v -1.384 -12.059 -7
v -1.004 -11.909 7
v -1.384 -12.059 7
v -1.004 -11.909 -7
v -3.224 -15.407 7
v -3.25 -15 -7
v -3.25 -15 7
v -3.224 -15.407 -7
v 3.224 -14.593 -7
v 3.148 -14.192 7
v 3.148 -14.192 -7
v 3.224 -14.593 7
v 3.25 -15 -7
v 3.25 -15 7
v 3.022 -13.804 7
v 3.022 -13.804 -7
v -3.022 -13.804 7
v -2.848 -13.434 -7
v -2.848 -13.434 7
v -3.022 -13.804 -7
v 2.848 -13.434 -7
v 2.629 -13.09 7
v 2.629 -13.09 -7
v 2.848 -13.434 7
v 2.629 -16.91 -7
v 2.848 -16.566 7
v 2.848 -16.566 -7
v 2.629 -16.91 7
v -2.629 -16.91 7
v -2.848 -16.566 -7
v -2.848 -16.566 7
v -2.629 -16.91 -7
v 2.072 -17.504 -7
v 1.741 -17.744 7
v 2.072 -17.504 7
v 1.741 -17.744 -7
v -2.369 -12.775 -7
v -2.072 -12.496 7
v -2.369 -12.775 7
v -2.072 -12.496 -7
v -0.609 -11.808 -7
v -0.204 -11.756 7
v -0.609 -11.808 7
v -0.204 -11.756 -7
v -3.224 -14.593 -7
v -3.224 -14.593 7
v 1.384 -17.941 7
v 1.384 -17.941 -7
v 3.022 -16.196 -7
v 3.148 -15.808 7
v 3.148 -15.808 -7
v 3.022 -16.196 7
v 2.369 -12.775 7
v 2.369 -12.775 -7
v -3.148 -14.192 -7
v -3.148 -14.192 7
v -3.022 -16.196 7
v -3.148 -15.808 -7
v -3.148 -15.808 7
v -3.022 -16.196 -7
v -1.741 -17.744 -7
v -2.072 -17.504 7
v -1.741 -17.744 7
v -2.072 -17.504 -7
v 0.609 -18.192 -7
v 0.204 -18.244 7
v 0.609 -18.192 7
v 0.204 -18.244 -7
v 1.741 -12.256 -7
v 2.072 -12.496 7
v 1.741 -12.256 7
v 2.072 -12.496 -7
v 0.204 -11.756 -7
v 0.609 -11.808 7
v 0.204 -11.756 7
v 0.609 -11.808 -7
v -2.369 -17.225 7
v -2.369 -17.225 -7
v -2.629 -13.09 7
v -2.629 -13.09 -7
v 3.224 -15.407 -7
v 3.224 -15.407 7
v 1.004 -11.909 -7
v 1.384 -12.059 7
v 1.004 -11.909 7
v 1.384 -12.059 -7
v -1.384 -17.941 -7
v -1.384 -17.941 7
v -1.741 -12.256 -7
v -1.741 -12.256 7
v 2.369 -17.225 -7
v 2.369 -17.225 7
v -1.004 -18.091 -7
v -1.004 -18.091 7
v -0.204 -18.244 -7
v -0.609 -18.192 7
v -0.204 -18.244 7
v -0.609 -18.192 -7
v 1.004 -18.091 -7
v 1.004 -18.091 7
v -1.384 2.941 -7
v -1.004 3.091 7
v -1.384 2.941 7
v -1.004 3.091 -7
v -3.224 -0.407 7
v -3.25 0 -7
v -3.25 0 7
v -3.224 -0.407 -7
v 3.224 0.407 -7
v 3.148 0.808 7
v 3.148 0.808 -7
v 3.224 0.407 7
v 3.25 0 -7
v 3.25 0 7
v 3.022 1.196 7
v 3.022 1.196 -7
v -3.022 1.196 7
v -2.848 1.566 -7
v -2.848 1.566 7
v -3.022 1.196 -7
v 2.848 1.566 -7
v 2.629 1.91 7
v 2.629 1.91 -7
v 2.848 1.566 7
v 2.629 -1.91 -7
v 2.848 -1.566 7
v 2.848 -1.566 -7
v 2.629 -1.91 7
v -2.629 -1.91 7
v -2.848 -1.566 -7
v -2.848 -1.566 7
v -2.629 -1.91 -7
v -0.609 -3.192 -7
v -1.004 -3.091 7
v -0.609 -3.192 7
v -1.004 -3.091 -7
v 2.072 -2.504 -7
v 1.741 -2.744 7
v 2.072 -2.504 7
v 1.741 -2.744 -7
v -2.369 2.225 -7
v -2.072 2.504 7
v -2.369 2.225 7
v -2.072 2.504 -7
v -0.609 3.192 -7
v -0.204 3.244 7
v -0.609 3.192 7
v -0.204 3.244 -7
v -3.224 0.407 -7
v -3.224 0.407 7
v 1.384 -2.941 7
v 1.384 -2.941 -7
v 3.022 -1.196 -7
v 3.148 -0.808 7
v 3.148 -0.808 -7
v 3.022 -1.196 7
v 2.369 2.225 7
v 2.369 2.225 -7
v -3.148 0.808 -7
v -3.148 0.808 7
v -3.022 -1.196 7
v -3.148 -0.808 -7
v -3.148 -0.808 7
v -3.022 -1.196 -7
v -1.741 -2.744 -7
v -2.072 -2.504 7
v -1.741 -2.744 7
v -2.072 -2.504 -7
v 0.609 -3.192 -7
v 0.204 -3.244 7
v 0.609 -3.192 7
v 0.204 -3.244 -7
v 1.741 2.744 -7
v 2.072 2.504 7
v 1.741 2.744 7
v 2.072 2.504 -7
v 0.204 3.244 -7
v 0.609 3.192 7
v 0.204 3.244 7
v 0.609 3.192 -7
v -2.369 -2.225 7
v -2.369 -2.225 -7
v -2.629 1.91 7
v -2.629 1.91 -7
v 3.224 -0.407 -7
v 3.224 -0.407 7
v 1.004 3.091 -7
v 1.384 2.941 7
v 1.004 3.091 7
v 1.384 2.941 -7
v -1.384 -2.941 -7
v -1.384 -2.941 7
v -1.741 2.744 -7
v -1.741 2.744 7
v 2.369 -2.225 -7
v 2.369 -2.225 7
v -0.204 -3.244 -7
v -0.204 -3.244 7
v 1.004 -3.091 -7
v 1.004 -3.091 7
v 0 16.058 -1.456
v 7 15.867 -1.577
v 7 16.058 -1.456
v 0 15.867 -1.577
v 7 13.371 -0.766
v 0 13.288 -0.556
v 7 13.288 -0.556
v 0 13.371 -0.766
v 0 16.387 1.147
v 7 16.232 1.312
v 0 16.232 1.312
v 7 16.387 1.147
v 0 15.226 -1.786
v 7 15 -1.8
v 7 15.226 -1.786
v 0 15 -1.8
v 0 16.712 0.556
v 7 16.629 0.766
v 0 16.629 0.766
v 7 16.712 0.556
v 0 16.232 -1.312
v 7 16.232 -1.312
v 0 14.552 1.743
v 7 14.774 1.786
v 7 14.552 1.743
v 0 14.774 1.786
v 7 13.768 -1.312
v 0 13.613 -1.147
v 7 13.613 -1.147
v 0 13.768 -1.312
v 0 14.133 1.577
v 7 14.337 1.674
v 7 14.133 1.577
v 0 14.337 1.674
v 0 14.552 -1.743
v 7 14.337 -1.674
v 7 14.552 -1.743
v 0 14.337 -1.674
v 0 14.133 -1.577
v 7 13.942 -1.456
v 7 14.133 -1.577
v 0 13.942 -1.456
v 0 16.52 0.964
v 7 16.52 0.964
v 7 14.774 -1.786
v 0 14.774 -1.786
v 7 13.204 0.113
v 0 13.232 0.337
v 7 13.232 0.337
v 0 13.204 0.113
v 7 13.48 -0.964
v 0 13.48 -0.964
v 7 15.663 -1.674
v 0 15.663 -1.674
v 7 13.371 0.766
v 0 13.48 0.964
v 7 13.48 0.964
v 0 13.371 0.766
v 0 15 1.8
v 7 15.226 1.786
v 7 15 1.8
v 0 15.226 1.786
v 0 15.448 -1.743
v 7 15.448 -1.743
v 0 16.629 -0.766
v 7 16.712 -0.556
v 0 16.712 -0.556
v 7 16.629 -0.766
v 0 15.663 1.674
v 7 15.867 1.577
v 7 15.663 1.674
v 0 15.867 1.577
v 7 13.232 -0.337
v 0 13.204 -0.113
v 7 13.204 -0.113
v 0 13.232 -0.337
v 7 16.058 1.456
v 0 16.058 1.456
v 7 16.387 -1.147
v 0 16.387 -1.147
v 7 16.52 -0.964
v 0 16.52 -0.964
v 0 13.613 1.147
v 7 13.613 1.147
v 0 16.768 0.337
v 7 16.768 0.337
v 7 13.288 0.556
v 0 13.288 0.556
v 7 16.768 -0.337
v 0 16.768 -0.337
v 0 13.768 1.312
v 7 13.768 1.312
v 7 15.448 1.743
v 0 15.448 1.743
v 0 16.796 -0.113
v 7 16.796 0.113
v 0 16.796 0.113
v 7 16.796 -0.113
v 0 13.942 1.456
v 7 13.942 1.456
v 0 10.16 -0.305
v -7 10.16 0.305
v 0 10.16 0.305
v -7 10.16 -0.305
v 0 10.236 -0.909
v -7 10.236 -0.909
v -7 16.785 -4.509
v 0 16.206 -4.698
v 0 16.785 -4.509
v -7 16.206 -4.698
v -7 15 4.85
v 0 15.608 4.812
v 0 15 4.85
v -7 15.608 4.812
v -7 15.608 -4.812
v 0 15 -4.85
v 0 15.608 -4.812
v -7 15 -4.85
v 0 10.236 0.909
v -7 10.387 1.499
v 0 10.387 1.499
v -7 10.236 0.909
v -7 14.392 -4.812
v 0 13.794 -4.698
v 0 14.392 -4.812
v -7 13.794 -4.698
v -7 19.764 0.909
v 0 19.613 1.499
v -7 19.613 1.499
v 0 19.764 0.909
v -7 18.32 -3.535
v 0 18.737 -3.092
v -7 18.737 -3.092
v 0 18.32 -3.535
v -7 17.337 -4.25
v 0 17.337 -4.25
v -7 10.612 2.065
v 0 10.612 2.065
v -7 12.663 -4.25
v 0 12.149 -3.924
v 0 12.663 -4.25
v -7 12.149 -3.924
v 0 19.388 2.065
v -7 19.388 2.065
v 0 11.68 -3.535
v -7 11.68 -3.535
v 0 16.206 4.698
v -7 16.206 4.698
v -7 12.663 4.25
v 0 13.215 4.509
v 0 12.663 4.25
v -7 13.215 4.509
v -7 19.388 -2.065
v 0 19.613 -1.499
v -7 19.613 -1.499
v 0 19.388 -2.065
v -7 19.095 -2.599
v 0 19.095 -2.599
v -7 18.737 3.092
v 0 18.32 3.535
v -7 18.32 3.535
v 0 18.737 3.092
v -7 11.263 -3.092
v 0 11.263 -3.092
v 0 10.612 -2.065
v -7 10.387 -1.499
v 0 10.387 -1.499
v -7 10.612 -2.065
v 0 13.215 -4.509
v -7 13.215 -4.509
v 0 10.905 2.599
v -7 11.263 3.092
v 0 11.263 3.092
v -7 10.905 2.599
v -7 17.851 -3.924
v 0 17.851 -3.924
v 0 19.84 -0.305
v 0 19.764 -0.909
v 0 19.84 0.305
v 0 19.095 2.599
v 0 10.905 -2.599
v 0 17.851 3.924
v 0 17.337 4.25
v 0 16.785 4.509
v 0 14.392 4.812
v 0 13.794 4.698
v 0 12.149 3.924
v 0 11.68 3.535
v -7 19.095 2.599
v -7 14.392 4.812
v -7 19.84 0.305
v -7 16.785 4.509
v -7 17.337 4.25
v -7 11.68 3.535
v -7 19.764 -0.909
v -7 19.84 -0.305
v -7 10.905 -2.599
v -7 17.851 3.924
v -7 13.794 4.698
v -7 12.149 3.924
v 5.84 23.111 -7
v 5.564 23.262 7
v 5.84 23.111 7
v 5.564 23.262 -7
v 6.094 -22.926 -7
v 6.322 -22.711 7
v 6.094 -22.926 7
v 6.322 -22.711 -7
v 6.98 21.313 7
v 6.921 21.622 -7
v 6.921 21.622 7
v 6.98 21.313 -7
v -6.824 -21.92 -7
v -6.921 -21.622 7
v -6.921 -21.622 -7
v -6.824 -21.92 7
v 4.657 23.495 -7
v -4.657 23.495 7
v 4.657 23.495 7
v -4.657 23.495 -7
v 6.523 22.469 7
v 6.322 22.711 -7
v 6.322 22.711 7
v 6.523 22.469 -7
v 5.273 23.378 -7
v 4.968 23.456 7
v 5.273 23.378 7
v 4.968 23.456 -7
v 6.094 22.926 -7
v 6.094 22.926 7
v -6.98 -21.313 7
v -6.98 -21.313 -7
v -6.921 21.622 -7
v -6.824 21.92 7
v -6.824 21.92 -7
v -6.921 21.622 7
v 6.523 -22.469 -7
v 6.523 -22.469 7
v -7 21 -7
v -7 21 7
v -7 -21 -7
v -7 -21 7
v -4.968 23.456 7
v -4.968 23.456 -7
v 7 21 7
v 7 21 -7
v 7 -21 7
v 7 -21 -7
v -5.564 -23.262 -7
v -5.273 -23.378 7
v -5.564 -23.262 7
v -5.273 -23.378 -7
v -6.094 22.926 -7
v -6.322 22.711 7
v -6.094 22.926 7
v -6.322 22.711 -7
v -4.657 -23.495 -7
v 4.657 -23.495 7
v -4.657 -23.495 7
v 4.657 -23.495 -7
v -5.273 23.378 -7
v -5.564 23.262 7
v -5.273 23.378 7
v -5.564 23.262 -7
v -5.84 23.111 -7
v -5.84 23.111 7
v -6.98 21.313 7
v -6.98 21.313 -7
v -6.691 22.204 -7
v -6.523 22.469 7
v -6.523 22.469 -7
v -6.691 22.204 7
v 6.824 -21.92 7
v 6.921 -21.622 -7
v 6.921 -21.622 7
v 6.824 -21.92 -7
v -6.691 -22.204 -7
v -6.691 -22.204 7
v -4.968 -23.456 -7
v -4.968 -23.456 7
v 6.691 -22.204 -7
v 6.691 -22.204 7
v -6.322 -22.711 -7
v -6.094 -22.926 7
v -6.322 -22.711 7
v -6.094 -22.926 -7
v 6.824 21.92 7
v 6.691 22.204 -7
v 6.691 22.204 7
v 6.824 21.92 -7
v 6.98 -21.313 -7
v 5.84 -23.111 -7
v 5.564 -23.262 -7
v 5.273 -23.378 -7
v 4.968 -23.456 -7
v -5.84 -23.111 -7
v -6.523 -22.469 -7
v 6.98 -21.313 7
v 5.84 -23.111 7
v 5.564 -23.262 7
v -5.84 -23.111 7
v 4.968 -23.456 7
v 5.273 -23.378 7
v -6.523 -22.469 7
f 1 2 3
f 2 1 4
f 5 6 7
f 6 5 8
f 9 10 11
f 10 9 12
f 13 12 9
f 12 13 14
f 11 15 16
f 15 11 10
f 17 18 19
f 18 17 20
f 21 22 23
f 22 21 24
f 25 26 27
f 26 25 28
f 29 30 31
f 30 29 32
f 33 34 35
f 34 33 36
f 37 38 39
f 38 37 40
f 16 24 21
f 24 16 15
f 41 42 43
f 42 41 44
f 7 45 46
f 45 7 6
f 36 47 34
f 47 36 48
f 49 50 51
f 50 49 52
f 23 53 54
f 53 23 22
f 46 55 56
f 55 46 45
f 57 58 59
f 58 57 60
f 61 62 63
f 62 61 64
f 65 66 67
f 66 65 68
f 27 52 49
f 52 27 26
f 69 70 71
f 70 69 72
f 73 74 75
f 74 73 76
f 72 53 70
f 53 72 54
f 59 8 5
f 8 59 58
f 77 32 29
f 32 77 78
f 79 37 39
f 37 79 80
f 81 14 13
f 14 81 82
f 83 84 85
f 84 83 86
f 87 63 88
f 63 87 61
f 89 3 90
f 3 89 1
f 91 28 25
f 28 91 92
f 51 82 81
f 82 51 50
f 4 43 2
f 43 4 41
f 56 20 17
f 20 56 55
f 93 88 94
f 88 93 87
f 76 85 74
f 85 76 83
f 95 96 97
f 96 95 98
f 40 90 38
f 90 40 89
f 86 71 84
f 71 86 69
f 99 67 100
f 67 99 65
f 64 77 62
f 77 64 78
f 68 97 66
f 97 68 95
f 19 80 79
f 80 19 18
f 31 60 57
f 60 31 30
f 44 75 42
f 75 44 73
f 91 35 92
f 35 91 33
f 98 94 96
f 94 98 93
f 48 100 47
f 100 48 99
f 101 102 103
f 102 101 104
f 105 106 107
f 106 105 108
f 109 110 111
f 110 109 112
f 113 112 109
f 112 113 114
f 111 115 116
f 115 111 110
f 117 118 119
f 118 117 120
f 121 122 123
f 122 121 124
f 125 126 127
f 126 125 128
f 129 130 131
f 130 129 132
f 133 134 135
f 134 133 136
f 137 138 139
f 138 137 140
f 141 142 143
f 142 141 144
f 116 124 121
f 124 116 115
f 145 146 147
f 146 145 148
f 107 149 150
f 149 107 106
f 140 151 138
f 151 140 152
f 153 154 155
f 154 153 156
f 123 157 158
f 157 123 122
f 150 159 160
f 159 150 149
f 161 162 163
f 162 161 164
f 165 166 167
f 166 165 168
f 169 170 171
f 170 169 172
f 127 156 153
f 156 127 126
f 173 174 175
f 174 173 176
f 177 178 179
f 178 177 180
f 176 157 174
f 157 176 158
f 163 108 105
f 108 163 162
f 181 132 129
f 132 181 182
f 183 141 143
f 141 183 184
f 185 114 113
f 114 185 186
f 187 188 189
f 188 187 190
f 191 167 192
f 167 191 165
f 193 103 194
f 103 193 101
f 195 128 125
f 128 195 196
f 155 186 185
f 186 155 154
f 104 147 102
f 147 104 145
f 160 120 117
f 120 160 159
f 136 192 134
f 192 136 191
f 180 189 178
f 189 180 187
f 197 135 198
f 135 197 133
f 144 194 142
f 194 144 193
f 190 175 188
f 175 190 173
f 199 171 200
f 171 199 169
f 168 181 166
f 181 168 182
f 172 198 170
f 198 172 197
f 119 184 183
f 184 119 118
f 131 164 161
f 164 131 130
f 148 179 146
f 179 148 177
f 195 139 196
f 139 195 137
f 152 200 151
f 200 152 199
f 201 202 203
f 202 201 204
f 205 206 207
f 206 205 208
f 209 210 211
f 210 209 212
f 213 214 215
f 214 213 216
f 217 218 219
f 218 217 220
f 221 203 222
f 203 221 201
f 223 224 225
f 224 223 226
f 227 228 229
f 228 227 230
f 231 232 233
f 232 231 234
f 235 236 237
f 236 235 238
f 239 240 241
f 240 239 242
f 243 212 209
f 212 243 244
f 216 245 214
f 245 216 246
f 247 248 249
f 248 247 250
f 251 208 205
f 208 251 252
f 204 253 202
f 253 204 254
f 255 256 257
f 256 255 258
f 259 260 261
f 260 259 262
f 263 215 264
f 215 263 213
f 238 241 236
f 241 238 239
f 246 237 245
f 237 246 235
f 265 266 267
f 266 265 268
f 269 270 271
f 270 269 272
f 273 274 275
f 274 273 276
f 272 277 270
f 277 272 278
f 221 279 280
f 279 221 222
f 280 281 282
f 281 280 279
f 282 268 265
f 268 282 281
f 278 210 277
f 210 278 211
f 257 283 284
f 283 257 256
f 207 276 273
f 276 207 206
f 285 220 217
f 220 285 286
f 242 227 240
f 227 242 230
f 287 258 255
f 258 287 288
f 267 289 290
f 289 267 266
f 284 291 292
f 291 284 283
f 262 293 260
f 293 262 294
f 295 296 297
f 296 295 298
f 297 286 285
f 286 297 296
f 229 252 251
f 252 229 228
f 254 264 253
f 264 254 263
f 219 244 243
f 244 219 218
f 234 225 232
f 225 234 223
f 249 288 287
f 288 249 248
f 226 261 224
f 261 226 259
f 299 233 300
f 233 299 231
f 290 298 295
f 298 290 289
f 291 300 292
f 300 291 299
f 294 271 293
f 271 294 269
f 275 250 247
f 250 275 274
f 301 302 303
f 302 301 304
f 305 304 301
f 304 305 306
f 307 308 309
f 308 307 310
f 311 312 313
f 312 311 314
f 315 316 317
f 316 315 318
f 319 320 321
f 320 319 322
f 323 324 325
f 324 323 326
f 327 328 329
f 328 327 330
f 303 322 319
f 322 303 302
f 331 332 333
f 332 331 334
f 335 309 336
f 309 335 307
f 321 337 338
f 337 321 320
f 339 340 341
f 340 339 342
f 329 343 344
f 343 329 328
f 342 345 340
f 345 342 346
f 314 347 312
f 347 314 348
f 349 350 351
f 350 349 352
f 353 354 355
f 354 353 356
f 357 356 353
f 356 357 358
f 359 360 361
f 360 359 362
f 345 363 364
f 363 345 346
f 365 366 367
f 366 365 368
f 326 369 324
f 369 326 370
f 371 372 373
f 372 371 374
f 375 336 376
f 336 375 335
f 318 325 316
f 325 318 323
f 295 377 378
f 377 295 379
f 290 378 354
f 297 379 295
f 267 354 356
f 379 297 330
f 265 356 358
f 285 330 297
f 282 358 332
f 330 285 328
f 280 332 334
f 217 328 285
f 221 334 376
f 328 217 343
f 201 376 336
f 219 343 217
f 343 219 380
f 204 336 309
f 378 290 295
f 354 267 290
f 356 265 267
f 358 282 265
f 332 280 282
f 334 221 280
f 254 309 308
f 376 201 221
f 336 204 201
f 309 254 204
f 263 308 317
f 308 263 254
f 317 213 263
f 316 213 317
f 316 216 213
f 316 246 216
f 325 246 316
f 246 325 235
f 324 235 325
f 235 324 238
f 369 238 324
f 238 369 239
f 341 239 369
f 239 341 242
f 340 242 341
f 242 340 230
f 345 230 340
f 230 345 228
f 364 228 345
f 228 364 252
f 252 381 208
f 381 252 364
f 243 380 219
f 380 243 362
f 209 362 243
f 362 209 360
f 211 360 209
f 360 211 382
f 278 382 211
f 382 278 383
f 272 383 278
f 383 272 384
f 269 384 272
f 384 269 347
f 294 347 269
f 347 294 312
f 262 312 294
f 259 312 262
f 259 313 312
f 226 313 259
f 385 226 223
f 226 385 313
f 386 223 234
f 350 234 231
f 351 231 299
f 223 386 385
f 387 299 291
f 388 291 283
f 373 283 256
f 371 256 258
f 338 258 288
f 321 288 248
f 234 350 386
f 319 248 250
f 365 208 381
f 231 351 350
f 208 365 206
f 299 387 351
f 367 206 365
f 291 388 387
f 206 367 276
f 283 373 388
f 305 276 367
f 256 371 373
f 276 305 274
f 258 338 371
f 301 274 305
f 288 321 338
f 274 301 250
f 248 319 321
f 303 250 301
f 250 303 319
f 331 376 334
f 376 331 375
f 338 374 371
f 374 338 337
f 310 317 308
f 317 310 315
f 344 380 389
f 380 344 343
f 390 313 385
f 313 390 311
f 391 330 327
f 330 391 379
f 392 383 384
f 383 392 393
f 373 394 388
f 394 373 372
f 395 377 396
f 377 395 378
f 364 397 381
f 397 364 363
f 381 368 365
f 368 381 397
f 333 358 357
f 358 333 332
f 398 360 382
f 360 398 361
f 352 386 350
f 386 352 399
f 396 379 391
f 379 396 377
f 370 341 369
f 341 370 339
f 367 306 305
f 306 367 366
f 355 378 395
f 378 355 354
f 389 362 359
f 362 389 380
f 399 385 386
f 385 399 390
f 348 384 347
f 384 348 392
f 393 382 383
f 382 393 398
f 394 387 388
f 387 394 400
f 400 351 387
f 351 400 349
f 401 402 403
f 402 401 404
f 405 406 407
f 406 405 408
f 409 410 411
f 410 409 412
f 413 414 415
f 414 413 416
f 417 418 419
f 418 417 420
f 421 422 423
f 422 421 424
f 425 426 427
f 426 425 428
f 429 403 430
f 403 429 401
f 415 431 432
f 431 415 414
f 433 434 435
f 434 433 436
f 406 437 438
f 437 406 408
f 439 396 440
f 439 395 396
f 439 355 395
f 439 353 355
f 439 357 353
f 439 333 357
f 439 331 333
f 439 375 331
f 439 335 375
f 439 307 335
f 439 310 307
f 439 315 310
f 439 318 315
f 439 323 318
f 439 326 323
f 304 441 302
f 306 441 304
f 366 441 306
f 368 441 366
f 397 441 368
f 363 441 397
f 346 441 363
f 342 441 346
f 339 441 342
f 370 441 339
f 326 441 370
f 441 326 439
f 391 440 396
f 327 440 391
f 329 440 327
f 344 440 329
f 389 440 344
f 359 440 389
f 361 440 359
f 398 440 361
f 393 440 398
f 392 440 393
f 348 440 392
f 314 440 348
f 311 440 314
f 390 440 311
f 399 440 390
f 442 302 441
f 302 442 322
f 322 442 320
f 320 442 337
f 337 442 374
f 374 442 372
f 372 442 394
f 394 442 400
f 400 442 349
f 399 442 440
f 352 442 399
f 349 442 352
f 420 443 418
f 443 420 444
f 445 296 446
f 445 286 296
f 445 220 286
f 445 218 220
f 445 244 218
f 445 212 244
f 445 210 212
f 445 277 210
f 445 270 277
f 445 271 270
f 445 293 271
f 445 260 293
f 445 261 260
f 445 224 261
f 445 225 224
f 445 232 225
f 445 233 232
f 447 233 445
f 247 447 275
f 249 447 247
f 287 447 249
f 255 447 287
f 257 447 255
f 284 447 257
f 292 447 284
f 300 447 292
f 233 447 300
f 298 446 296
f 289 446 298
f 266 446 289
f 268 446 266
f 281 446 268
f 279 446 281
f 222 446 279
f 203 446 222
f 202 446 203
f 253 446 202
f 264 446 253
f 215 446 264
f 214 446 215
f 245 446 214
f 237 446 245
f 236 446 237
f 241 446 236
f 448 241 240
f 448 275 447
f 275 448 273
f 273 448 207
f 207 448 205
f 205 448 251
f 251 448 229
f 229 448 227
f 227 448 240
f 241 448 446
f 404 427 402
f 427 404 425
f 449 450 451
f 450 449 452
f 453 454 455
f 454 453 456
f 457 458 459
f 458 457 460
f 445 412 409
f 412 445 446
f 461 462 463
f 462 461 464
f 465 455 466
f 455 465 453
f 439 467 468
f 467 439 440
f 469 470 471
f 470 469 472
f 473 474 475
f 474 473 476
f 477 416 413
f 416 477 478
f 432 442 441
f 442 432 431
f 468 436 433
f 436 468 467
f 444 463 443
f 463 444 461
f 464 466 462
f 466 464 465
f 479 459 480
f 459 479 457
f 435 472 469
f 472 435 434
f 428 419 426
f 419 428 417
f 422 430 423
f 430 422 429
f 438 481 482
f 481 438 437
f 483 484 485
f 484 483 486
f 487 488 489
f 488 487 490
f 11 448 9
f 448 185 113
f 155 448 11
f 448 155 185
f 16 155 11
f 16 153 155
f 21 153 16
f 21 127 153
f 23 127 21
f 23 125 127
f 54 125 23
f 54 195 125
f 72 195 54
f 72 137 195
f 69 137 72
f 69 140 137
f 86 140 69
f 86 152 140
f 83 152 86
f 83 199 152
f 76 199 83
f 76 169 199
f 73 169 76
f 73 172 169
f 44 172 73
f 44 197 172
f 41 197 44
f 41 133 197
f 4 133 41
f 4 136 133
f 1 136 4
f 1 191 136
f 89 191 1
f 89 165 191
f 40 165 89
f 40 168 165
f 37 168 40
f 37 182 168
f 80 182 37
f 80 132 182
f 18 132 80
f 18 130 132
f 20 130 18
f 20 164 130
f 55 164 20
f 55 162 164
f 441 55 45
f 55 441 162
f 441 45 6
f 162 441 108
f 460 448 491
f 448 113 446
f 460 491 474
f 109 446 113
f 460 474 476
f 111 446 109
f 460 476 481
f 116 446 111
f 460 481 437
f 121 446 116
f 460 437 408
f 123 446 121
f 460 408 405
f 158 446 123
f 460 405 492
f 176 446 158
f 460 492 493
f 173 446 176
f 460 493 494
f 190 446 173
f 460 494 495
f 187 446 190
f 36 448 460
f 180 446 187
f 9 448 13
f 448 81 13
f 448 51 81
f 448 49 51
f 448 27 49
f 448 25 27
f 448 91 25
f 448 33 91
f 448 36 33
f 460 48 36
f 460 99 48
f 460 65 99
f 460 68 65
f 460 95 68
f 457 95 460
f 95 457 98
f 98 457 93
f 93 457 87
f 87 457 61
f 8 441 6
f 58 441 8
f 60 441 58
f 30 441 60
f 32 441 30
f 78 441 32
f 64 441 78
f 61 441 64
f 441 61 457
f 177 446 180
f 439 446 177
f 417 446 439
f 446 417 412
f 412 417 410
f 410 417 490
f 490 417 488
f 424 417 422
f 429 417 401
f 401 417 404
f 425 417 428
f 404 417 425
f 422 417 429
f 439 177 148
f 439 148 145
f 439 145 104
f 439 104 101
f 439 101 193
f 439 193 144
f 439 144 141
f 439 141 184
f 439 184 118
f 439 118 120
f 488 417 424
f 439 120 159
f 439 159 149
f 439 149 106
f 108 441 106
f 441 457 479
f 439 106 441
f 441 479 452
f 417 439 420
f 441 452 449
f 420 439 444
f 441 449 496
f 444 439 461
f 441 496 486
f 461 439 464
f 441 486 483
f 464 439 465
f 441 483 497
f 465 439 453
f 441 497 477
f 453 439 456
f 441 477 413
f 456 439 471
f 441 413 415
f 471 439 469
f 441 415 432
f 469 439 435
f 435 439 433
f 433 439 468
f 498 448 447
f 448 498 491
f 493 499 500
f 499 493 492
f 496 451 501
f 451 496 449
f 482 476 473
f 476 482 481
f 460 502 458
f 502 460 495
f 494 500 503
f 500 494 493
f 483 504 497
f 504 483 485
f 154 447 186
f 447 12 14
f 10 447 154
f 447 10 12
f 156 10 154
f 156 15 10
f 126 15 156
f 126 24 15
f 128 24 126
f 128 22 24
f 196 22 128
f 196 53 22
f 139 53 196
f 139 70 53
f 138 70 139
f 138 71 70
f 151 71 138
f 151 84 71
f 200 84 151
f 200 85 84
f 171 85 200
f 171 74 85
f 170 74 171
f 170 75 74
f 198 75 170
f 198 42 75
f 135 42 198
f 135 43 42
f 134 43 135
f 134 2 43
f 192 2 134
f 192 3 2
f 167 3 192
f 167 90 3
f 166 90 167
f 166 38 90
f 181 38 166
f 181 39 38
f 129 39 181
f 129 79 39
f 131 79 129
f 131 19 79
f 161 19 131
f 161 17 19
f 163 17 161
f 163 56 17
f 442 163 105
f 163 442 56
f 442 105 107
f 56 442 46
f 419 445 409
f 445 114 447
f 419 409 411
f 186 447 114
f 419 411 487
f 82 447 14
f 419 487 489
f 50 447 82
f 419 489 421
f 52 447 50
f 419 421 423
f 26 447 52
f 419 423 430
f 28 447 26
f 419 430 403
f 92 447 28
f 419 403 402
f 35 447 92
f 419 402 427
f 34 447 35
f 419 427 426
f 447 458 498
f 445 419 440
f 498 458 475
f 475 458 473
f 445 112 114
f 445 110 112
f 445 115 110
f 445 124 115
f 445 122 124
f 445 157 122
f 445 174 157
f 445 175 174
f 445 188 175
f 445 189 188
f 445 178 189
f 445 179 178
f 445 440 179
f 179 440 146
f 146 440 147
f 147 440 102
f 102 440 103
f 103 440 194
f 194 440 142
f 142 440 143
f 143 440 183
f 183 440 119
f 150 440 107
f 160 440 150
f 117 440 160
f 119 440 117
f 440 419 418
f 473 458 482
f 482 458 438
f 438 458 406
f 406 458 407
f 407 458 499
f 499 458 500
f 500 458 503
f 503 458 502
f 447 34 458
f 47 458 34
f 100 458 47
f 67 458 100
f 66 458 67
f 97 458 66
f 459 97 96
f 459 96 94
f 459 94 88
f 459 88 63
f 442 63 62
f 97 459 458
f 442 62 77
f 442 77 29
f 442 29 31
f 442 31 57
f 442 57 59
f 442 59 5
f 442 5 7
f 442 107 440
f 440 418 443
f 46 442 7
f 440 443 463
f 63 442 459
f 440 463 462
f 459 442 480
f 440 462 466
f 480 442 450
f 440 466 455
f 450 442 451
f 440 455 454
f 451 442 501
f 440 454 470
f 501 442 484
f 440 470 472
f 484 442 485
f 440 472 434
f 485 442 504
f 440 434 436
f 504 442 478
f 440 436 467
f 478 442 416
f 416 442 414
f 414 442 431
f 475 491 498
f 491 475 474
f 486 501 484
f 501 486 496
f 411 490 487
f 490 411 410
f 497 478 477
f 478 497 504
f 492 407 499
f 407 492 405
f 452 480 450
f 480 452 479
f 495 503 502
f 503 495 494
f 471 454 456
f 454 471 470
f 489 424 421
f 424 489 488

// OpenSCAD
$fn = 50;


difference() {
	union() {
		translate(v = [0, 0, -7.0000000000]) {
			hull() {
				translate(v = [-4.5000000000, 21.0000000000, 0]) {
					cylinder(h = 14, r = 2.5000000000);
				}
				translate(v = [4.5000000000, 21.0000000000, 0]) {
					cylinder(h = 14, r = 2.5000000000);
				}
				translate(v = [-4.5000000000, -21.0000000000, 0]) {
					cylinder(h = 14, r = 2.5000000000);
				}
				translate(v = [4.5000000000, -21.0000000000, 0]) {
					cylinder(h = 14, r = 2.5000000000);
				}
			}
		}
	}
	union() {
		translate(v = [0.0000000000, -15.0000000000, -50.0000000000]) {
			cylinder(h = 100, r = 3.2500000000);
		}
		translate(v = [0.0000000000, 0.0000000000, -50.0000000000]) {
			cylinder(h = 100, r = 3.2500000000);
		}
		translate(v = [-50, 15, 0]) {
			rotate(a = [0, 90, 0]) {
				cylinder(h = 100, r = 1.8000000000);
			}
		}
		translate(v = [-100, 15, 0]) {
			rotate(a = [0, 90, 0]) {
				cylinder(h = 100, r = 4.8500000000);
			}
		}
	}
}
